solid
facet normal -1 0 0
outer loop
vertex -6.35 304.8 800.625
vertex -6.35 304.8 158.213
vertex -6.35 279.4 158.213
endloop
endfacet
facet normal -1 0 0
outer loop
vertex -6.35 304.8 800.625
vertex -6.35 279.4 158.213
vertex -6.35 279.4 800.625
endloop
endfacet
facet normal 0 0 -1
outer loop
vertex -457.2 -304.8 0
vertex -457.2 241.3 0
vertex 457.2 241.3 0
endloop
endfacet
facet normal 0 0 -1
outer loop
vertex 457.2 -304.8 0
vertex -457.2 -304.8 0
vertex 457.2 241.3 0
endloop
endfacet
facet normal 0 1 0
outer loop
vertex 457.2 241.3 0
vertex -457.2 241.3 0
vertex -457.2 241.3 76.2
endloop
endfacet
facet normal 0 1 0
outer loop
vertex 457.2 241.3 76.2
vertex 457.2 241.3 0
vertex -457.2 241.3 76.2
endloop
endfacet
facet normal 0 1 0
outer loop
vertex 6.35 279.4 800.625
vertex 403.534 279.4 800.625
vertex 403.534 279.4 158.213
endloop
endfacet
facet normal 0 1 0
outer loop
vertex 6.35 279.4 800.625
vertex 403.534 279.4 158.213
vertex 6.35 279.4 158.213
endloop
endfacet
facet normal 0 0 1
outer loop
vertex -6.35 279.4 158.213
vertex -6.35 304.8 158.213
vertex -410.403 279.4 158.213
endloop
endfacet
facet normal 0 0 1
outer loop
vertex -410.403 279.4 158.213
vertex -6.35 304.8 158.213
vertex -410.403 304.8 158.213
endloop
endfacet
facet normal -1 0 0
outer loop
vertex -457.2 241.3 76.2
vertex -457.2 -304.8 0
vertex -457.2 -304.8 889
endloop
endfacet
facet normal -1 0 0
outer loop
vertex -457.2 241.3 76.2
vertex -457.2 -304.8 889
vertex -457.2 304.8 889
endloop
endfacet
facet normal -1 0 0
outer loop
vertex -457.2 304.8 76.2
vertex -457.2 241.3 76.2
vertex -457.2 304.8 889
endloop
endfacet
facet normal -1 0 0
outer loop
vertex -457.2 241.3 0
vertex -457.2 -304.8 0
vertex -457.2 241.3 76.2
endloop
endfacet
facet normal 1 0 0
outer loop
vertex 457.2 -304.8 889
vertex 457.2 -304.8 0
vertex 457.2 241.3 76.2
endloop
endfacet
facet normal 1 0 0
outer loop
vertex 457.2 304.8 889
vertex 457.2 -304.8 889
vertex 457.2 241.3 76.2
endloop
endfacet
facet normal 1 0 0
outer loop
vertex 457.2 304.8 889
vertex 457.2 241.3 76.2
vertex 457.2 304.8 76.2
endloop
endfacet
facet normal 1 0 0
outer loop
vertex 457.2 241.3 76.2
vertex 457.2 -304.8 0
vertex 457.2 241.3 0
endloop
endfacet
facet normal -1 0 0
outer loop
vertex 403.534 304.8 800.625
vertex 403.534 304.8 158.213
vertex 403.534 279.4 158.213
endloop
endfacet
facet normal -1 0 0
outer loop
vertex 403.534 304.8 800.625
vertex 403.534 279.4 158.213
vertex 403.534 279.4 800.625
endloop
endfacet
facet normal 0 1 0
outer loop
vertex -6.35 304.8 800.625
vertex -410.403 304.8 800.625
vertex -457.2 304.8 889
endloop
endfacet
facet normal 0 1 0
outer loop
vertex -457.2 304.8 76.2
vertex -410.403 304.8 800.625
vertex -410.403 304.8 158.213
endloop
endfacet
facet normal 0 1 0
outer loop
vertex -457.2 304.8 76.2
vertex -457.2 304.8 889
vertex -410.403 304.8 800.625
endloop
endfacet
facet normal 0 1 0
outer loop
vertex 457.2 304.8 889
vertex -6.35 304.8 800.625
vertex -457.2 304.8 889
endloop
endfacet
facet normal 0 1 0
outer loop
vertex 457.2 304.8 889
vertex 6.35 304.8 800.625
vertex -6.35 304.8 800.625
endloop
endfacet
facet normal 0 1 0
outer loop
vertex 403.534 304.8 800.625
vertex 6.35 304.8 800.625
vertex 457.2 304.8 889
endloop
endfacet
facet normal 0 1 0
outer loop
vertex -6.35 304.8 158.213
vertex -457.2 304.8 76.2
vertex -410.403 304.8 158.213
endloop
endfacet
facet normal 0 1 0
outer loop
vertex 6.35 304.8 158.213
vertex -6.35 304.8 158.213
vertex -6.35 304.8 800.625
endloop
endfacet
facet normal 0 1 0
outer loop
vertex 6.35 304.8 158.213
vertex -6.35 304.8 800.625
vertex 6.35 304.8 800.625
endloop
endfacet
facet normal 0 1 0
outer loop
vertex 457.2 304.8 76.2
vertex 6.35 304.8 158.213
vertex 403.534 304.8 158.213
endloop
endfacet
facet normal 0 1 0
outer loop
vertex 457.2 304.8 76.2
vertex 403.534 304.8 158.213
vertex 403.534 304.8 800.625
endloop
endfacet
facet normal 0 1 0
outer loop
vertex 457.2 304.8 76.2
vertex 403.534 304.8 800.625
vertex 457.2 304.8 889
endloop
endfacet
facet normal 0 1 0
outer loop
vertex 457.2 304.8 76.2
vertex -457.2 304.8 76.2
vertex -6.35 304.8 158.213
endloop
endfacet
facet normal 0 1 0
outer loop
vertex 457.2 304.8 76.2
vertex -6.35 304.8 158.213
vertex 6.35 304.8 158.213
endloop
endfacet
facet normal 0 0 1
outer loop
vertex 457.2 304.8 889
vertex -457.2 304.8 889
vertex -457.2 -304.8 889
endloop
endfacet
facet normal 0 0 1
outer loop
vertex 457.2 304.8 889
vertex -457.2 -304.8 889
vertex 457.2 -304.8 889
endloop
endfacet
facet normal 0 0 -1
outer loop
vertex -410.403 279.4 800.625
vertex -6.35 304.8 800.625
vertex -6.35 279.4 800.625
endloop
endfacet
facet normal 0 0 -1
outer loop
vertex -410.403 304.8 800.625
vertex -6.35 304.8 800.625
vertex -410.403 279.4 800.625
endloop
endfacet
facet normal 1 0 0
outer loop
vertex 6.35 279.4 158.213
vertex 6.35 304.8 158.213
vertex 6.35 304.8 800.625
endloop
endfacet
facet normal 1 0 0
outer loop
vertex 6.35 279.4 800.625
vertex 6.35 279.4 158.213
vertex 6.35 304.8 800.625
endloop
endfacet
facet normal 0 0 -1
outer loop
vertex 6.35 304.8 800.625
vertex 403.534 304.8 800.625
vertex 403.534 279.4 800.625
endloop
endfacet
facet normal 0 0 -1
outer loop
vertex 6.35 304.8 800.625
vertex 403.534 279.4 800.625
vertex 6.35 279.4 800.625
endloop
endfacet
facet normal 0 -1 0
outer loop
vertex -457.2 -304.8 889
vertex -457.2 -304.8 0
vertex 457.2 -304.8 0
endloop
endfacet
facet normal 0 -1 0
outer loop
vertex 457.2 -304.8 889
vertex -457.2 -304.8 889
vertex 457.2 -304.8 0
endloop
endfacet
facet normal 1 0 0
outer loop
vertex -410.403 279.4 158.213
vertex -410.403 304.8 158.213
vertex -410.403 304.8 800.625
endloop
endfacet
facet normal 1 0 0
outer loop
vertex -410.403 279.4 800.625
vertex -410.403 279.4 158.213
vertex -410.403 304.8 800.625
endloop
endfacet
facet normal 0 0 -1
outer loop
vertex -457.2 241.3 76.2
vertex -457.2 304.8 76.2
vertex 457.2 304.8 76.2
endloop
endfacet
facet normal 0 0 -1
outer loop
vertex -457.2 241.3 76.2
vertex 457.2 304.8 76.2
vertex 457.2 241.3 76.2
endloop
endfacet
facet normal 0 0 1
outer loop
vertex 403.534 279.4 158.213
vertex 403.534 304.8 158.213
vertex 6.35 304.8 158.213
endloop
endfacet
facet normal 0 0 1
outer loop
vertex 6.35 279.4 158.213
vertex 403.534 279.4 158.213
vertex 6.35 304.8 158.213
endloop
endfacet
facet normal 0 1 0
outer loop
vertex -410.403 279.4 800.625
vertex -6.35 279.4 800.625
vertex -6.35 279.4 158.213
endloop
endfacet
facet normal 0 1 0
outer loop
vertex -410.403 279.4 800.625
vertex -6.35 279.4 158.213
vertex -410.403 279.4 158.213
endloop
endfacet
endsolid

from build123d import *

# Parameters (mm, degrees)
F0_W     = 914.4
F0_H     = 609.6
F1_DEPTH = 889
F2_W     = 63.5
F2_H     = 76.2
F3_DEPTH = 914.4
F4_W     = 397.184085
F4_H     = 642.411709
F4_W_2   = 404.053162
F5_DEPTH = 25.4


with BuildPart() as f1:
    # F0 (on Top) → F1 (new body)
    with BuildSketch(Plane.XY):
        Rectangle(F0_W, F0_H)
    extrude(amount=F1_DEPTH)

    # F2 (on face) → F3 (cut)
    with BuildSketch(Plane(origin=(-457.2, 0, 0), x_dir=(0, -1, 0), z_dir=(-1, 0, 0))):
        with Locations((-273.05, 38.1)):
            Rectangle(F2_W, F2_H)
    extrude(amount=-F3_DEPTH, mode=Mode.SUBTRACT)

    # F4 (on face) → F5 (cut)
    with BuildSketch(Plane(origin=(0, 304.8, 0), x_dir=(-1, 0, 0), z_dir=(0, 1, 0))):
        with Locations((-204.942043, 479.41935)):
            Rectangle(F4_W, F4_H)
        with Locations((208.376581, 479.41935)):
            Rectangle(F4_W_2, F4_H)
    extrude(amount=-F5_DEPTH, mode=Mode.SUBTRACT)


solid = f1.part
